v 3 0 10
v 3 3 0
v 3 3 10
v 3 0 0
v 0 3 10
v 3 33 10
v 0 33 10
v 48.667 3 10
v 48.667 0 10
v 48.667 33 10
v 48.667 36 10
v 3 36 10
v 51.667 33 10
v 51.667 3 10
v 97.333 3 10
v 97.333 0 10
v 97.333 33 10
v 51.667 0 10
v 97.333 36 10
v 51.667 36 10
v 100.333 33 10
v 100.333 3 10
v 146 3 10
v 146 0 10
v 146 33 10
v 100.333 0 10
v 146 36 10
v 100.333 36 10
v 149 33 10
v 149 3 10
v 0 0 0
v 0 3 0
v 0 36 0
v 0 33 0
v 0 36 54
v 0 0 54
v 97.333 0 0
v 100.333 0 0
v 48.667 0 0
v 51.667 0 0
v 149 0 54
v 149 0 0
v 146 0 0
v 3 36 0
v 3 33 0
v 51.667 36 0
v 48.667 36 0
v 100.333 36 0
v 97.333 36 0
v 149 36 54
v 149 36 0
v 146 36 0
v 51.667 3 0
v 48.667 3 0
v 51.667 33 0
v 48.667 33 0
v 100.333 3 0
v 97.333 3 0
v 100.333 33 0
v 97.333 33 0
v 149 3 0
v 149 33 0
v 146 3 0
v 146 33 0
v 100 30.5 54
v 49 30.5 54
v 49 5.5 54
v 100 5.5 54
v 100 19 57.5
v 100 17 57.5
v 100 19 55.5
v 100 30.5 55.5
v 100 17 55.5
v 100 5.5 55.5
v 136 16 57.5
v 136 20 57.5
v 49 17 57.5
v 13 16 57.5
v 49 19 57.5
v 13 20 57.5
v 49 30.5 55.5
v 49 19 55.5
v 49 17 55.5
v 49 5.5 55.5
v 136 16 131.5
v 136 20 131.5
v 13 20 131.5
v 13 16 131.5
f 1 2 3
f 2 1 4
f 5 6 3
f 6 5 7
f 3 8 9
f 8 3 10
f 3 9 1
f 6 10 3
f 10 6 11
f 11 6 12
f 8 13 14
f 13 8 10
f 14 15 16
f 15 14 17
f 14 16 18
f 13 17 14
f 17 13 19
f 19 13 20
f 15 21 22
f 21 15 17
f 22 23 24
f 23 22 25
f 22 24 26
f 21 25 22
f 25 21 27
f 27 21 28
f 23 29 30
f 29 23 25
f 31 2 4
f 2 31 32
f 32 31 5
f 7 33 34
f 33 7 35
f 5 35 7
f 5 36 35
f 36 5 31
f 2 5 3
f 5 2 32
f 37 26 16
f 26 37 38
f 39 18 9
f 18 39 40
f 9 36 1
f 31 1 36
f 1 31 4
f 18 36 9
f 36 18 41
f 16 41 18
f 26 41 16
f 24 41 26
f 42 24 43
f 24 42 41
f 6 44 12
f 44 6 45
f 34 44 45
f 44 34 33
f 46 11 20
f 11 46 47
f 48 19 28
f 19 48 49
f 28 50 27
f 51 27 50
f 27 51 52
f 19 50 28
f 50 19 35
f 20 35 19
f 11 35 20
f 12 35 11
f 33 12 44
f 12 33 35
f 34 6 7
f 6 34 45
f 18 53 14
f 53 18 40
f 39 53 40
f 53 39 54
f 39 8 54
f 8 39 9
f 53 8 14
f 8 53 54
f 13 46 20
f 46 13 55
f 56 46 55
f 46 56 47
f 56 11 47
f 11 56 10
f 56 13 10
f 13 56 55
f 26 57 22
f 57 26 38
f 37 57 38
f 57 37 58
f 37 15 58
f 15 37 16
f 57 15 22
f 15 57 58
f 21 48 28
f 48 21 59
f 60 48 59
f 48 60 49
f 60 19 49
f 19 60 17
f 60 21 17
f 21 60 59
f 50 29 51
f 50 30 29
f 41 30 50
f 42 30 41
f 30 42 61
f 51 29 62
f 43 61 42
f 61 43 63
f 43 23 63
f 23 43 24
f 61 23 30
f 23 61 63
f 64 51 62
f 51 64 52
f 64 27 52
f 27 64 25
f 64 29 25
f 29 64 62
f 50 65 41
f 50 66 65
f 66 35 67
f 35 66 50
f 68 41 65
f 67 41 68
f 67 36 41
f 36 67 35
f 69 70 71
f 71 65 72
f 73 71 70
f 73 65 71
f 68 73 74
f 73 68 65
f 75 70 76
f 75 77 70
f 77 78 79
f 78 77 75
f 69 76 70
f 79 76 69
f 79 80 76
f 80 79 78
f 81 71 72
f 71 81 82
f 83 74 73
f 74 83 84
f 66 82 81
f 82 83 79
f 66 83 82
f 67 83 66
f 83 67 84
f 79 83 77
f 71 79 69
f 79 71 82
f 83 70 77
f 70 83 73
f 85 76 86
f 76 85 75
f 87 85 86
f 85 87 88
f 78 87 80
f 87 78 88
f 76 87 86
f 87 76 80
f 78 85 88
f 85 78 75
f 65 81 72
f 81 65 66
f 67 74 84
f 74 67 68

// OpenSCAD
cabinet_length = 149;
cabinet_height = 44;
cabinet_depth = 36;

cabinet_foot_height = 10;
// original val = 2, 3 for better printability
cabinet_foot_width = 3;

tv_foot_width = 51;
tv_foot_depth = 25;
tv_foot_height = 1.5;

tv_middle_width = tv_foot_width;
tv_middle_depth = 2;
tv_middle_height = 2;

tv_width = 123;
tv_depth = 4;
tv_height = 74;

module cabinet() {
  translate([0, 0, cabinet_foot_height])
    cube([cabinet_length, cabinet_depth, cabinet_height]);

  for (i = [0 : (cabinet_length - cabinet_foot_width) / 3 : (cabinet_length - cabinet_foot_width)]) {
    translate([i, 0, 0]) {
      cube([cabinet_foot_width, cabinet_foot_width, cabinet_foot_height]);
      translate([0, cabinet_depth - cabinet_foot_width, 0])
        cube([cabinet_foot_width, cabinet_foot_width, cabinet_foot_height]);
    }
  }
}

module tv() {
  translate([tv_width / 2, tv_foot_depth / 2, tv_foot_height / 2]) {
    cube([tv_foot_width, tv_foot_depth, tv_foot_height], center = true);

    translate([0, 0, tv_foot_height / 2 + tv_middle_height / 2]) {
      cube([tv_middle_width, tv_middle_depth, tv_middle_height], center = true);

      translate([0, 0, tv_middle_height / 2 + tv_height / 2]) {
        cube([tv_width, tv_depth, tv_height], center = true);
      }
    }
  }
}

cabinet();

translate([cabinet_length / 2 - tv_width / 2, cabinet_depth / 2 - tv_foot_depth / 2, cabinet_height + cabinet_foot_height])
  tv();
